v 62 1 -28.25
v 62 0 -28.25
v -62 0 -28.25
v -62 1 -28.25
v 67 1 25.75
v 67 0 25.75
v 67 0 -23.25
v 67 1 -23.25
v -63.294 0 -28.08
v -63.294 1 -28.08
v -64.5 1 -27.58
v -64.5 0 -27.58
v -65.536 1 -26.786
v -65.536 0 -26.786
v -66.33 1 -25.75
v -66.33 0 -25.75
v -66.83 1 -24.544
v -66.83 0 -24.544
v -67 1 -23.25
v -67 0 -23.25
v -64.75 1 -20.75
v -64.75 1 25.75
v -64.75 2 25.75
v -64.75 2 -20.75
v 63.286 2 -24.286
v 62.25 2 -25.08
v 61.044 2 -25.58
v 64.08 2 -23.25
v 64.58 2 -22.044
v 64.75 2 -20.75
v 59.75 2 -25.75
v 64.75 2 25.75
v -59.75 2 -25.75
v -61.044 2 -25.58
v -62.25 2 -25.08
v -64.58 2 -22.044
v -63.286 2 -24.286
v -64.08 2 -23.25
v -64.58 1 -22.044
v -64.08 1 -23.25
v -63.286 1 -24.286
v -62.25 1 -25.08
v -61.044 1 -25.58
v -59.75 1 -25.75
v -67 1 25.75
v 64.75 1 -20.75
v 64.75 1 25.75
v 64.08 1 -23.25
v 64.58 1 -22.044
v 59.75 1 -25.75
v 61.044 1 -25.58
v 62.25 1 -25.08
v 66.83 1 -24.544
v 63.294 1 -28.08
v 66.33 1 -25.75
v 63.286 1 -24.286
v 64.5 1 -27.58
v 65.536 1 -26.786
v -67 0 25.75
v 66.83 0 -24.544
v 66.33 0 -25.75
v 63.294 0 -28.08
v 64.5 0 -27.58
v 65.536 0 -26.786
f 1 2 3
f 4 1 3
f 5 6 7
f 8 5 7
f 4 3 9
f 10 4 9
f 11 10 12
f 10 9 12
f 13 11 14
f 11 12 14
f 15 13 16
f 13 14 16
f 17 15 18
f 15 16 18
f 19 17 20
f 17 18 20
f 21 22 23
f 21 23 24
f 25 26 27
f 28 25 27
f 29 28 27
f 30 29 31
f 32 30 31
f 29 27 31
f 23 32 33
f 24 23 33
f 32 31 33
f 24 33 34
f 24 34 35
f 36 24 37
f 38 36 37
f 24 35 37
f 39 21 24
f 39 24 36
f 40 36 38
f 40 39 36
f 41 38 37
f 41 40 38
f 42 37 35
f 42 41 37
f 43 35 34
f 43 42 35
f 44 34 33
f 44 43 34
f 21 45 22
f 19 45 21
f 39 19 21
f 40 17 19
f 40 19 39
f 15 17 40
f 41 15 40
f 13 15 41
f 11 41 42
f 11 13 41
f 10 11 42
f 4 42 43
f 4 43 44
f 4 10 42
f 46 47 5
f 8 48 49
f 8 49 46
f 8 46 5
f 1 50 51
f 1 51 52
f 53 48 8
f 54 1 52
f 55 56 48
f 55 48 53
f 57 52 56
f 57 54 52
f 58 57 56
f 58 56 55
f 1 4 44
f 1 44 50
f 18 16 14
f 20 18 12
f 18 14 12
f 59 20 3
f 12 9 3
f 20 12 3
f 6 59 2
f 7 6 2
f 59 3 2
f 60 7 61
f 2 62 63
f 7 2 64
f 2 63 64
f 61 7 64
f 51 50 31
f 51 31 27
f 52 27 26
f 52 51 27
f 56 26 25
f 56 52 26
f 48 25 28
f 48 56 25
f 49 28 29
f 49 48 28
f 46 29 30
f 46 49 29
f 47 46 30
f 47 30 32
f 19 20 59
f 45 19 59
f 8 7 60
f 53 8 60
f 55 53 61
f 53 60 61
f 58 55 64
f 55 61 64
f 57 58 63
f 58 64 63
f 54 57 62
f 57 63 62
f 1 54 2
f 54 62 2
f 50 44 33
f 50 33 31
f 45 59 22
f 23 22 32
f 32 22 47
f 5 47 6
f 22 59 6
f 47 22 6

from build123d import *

# Parameters (mm, degrees)
BOSS_EXTRUDE1_DEPTH = 2
BOSS_EXTRUDE2_DEPTH = 1


with BuildPart() as part:
    # Sketch1 → Boss-Extrude1 (new body)
    with BuildSketch(Plane(origin=(0, 0, 0), x_dir=(1, 0, 0), z_dir=(0, 1, 0))):
        with BuildLine():
            Line((-59.75, 25.75), (59.75, 25.75))
            ThreePointArc((59.75, 25.75), (63.285533906, 24.285533906), (64.75, 20.75))
            Line((64.75, 20.75), (64.75, -25.75))
            Line((64.75, -25.75), (-64.75, -25.75))
            Line((-64.75, -25.75), (-64.75, 20.75))
            ThreePointArc((-64.75, 20.75), (-63.285533906, 24.285533906), (-59.75, 25.75))
        make_face()
    extrude(amount=BOSS_EXTRUDE1_DEPTH)

    # Sketch2 → Boss-Extrude2 (add)
    with BuildSketch(Plane(origin=(0, 0, 0), x_dir=(1, 0, 0), z_dir=(0, 1, 0))):
        with BuildLine():
            Line((-67, -25.75), (67, -25.75))
            Line((67, -25.75), (67, 23.25))
            ThreePointArc((67, 23.25), (65.535533906, 26.785533906), (62, 28.25))
            Line((62, 28.25), (-62, 28.25))
            ThreePointArc((-62, 28.25), (-65.535533906, 26.785533906), (-67, 23.25))
            Line((-67, 23.25), (-67, -25.75))
        make_face()
    extrude(amount=BOSS_EXTRUDE2_DEPTH)


solid = part.part
